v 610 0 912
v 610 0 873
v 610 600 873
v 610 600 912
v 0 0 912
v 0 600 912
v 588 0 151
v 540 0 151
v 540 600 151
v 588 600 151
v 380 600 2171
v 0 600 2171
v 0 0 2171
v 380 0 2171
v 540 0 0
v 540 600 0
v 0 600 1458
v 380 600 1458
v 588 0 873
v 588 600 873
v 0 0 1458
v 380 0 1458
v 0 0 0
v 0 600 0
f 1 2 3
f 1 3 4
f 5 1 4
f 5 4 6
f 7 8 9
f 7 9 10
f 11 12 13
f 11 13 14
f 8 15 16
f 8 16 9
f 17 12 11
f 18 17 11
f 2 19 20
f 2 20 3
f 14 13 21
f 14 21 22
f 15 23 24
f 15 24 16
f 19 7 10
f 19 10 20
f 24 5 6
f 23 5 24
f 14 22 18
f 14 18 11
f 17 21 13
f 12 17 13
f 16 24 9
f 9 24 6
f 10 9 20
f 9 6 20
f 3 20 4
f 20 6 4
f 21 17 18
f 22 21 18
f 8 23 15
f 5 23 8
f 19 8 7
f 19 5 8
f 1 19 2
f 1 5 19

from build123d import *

# Parameters (mm, degrees)
F0_W     = 540
F0_H     = 151
F0_W_2   = 380
F0_H_2   = 713
F1_DEPTH = 600


with BuildPart() as f1:
    # F0 (on Front) → F1 (new body)
    with BuildSketch(Plane.XZ):
        Polygon((588, 873), (0, 873), (0, 151), (540, 151), (588, 151), align=None)
        Polygon((610, 912), (0, 912), (0, 873), (588, 873), (610, 873), align=None)
        with Locations((270, 75.5)):
            Rectangle(F0_W, F0_H)
        with Locations((190, 1814.5)):
            Rectangle(F0_W_2, F0_H_2)
    extrude(amount=-F1_DEPTH)


solid = f1.part
